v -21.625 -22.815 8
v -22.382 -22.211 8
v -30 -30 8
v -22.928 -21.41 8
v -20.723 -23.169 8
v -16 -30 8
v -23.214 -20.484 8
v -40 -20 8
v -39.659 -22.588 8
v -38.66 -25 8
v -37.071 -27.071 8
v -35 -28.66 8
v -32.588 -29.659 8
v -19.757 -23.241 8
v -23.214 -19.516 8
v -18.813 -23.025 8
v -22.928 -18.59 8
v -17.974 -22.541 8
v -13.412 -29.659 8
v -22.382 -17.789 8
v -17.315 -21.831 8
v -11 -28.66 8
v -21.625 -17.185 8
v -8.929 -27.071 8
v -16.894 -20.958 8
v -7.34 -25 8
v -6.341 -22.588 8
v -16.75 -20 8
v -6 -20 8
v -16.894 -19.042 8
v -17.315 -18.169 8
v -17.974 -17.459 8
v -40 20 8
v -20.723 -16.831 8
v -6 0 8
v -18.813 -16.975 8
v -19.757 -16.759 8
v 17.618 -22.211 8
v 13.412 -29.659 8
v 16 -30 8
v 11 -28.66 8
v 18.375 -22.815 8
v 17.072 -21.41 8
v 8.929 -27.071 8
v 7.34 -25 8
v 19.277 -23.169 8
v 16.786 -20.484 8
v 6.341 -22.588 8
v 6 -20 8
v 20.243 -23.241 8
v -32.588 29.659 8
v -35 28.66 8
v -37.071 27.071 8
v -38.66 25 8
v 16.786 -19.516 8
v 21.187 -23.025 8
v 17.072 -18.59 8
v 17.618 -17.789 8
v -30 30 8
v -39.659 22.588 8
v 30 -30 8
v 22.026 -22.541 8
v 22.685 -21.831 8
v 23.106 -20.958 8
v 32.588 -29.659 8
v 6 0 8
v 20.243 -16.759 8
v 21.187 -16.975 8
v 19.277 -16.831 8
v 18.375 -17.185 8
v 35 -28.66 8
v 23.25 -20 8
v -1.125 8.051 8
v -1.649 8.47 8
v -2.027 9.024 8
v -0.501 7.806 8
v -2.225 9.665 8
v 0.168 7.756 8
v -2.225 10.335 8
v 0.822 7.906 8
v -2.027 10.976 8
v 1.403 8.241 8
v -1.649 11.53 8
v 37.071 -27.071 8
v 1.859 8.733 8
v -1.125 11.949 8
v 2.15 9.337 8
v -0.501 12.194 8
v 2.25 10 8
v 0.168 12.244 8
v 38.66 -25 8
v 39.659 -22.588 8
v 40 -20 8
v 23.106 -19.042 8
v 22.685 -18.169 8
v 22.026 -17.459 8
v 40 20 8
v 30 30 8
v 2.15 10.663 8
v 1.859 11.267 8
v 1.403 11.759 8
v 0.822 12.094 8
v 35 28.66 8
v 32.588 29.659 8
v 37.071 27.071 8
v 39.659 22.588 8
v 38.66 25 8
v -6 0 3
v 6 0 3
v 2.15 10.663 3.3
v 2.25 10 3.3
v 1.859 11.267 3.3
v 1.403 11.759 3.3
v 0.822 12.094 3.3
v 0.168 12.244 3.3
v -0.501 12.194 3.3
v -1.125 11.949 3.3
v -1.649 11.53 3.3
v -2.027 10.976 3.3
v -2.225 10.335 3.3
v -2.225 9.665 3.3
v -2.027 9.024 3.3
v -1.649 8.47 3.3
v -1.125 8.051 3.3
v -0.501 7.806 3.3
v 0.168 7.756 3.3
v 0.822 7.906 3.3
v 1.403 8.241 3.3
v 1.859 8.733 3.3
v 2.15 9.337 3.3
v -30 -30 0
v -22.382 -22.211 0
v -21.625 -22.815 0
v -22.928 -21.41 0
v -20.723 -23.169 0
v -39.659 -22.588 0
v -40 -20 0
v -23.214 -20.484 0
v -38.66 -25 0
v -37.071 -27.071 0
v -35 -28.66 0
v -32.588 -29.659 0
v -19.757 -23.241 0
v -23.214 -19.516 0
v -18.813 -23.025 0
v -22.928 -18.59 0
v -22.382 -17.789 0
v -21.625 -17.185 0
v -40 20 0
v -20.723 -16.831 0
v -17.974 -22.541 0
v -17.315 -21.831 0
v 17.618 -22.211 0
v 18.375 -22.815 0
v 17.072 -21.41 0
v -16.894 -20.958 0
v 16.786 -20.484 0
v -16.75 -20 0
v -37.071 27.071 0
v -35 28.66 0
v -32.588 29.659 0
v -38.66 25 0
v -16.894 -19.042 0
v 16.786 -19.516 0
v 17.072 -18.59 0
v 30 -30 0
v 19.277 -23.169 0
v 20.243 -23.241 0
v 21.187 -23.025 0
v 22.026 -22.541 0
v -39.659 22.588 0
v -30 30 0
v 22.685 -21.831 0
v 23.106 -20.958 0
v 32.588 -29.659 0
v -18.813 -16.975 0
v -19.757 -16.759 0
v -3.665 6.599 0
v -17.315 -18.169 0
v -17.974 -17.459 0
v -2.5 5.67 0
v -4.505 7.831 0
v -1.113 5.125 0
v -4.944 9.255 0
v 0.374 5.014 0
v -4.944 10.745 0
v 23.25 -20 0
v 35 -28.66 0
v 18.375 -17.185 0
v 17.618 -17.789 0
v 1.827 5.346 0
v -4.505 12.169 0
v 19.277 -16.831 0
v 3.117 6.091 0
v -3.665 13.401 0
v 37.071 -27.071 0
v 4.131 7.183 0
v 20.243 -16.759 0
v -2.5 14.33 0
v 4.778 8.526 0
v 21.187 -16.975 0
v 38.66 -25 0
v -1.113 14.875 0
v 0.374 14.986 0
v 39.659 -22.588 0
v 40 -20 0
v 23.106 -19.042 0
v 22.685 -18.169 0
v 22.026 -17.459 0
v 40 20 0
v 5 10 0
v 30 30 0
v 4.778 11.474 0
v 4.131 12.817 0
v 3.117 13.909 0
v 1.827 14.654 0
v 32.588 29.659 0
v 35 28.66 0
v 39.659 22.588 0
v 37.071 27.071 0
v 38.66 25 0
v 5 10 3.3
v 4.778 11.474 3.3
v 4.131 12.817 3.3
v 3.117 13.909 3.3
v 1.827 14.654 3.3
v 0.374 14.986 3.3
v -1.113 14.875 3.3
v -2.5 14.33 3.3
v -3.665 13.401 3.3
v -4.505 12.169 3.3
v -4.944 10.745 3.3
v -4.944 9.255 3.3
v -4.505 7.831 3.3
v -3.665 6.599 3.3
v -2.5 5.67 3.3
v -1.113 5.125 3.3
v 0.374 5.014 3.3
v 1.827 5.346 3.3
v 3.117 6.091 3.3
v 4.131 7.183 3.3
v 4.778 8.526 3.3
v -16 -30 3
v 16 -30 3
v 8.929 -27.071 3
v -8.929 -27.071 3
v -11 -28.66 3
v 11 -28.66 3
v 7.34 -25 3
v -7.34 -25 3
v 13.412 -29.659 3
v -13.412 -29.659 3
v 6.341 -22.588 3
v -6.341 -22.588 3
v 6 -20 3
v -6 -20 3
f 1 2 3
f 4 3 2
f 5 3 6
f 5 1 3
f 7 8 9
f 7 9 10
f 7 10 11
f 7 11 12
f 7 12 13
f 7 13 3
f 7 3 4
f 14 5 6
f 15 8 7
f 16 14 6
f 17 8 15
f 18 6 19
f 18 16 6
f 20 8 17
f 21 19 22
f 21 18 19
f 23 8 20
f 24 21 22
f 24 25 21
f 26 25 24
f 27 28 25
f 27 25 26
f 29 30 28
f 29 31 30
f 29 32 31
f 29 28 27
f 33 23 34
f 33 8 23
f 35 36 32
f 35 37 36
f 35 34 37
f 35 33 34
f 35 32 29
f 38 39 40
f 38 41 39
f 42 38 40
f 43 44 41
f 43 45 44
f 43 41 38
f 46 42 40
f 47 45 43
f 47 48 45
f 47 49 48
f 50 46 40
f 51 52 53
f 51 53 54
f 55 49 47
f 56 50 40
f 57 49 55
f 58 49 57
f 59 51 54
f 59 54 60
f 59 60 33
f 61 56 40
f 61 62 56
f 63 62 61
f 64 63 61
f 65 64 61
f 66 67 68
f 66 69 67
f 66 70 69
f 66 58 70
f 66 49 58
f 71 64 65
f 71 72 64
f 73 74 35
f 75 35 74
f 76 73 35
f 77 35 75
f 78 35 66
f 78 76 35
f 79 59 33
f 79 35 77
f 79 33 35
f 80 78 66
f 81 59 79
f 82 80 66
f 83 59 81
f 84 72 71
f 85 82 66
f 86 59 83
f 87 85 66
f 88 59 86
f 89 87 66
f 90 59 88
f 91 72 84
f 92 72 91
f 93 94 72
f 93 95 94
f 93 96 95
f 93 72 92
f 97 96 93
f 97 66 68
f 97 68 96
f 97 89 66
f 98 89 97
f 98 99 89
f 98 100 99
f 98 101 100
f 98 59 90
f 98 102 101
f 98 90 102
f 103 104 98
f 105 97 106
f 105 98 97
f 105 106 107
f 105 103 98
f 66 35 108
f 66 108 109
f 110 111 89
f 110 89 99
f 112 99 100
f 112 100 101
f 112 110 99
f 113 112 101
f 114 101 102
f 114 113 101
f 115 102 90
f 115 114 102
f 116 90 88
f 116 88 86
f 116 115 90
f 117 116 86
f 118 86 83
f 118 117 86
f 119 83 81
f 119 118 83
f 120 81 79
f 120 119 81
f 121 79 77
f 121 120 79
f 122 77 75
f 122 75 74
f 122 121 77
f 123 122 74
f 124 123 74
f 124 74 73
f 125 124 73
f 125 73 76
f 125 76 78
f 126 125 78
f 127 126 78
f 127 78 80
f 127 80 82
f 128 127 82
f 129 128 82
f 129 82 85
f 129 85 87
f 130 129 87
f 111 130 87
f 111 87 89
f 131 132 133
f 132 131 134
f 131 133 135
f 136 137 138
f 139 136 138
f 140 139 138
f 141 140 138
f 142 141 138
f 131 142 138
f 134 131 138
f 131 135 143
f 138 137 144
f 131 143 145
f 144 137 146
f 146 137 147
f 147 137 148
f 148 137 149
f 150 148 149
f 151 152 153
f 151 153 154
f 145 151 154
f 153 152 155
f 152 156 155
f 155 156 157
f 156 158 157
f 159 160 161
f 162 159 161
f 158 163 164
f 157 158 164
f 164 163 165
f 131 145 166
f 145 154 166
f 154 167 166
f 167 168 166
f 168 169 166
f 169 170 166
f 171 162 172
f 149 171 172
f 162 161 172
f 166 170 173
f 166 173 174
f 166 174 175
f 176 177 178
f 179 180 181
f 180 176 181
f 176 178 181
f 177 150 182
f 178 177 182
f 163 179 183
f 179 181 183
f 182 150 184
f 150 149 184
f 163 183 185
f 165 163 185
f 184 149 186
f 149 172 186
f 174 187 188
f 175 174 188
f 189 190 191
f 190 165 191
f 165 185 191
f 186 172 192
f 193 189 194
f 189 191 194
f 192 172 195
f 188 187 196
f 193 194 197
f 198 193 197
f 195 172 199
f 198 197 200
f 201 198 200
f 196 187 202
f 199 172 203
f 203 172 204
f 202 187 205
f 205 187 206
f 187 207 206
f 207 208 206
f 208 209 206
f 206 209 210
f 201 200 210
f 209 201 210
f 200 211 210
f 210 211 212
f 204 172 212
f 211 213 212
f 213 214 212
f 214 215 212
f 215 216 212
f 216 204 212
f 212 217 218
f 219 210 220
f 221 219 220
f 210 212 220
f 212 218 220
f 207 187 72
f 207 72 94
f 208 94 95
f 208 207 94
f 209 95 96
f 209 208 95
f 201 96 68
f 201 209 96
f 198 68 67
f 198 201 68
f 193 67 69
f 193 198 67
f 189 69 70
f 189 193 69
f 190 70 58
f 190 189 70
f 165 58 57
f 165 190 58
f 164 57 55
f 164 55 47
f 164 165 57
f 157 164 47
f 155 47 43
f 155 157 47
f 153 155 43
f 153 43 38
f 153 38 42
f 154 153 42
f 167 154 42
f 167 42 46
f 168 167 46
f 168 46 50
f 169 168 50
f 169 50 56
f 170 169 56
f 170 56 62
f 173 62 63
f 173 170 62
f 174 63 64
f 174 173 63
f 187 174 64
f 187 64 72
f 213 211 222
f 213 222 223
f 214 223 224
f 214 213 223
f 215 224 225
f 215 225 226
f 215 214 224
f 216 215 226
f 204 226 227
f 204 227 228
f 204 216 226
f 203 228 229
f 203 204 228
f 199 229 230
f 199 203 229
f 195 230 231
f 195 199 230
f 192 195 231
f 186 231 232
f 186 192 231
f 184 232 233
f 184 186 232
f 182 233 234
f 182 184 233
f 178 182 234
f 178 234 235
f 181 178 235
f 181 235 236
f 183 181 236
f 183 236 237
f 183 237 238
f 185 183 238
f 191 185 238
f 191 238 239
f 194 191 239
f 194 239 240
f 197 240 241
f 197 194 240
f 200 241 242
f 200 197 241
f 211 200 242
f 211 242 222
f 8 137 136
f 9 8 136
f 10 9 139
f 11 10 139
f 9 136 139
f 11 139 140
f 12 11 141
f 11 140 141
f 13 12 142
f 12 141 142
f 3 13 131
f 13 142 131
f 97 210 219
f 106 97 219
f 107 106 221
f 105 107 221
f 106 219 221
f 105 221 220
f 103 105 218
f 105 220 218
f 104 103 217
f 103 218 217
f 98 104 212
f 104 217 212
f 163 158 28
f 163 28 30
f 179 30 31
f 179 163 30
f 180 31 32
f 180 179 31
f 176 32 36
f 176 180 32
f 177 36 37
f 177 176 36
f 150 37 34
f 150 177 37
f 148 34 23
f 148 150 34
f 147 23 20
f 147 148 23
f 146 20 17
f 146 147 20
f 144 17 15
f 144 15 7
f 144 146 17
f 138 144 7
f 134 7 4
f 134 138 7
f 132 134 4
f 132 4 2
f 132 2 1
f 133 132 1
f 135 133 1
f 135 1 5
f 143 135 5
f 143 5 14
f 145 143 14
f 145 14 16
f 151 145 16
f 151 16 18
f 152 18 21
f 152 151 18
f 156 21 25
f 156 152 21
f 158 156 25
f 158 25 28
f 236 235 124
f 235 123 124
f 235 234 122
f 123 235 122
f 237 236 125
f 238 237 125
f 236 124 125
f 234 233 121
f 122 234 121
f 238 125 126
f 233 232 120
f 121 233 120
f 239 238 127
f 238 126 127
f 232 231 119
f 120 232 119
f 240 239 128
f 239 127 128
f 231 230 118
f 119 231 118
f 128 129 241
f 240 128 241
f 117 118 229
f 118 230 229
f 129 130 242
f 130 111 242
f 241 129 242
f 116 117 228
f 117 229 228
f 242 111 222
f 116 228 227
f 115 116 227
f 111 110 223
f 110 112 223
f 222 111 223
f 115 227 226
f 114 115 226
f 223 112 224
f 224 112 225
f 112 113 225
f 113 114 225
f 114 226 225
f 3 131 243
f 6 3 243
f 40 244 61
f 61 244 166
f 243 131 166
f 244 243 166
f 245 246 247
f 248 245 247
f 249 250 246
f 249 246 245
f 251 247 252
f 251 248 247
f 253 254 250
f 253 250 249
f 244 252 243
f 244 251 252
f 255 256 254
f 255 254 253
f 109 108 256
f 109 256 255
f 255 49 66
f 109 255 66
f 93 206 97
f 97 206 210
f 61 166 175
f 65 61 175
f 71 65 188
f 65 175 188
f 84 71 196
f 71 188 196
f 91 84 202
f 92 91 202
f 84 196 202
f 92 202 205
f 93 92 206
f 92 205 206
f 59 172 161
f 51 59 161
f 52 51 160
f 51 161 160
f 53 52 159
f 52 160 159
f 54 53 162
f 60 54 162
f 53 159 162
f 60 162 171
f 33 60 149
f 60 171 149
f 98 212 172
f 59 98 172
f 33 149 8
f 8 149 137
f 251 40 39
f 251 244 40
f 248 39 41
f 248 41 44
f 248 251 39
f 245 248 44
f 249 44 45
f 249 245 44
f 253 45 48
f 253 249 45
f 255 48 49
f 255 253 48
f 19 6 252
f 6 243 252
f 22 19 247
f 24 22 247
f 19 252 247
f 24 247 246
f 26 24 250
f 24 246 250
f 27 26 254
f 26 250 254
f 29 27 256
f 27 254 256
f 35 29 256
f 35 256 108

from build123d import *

# Parameters (mm, degrees)
SKETCH_1_R          = 3.25
SKETCH_1_R_2        = 2.25
EXTRUDE_1_DEPTH     = 8
SKETCH_1_3_R        = 5
SKETCH_1_3_R_2      = 2.25
CUT_EXTRUDE_1_DEPTH = 3.3
SKETCH_2_W          = 12
SKETCH_2_H          = 30
CUT_EXTRUDE_2_DEPTH = 5
FILLET_1_R          = 10


with BuildPart() as part:
    # 草图1 → 凸台-拉伸1 (new body)
    with BuildSketch(Plane.XY):
        with BuildLine():
            ThreePointArc((40, 20), (37.071067812, 27.071067812), (30, 30))
            Line((30, 30), (-30, 30))
            ThreePointArc((-30, 30), (-37.071067812, 27.071067812), (-40, 20))
            Line((-40, 20), (-40, -20))
            ThreePointArc((-40, -20), (-37.071067812, -27.071067812), (-30, -30))
            Line((-30, -30), (30, -30))
            ThreePointArc((30, -30), (37.071067812, -27.071067812), (40, -20))
            Line((40, -20), (40, 20))
        make_face()
        with Locations((-20, -20)):
            Circle(SKETCH_1_R, mode=Mode.SUBTRACT)
        with Locations((20, -20)):
            Circle(SKETCH_1_R, mode=Mode.SUBTRACT)
        with Locations((0, 10)):
            Circle(SKETCH_1_R_2, mode=Mode.SUBTRACT)
    extrude(amount=EXTRUDE_1_DEPTH)

    # 草图1<3> → 切除-拉伸1 (cut)
    with BuildSketch(Plane.XY):
        with Locations((0, 10)):
            Circle(SKETCH_1_3_R)
        with Locations((0, 10)):
            Circle(SKETCH_1_3_R_2, mode=Mode.SUBTRACT)
    extrude(amount=CUT_EXTRUDE_1_DEPTH, mode=Mode.SUBTRACT)

    # 草图2 → 切除-拉伸2 (cut)
    with BuildSketch(Plane.XY.offset(8)):
        with Locations((0, -15)):
            Rectangle(SKETCH_2_W, SKETCH_2_H)
    extrude(amount=-CUT_EXTRUDE_2_DEPTH, mode=Mode.SUBTRACT)

    # 圆角1
    fillet_1_edges = [part.edges().sort_by_distance(p)[0] for p in [
        (-6, -30, 5.5),
        (6, -30, 5.5),
    ]]
    fillet(fillet_1_edges, radius=FILLET_1_R)


solid = part.part
